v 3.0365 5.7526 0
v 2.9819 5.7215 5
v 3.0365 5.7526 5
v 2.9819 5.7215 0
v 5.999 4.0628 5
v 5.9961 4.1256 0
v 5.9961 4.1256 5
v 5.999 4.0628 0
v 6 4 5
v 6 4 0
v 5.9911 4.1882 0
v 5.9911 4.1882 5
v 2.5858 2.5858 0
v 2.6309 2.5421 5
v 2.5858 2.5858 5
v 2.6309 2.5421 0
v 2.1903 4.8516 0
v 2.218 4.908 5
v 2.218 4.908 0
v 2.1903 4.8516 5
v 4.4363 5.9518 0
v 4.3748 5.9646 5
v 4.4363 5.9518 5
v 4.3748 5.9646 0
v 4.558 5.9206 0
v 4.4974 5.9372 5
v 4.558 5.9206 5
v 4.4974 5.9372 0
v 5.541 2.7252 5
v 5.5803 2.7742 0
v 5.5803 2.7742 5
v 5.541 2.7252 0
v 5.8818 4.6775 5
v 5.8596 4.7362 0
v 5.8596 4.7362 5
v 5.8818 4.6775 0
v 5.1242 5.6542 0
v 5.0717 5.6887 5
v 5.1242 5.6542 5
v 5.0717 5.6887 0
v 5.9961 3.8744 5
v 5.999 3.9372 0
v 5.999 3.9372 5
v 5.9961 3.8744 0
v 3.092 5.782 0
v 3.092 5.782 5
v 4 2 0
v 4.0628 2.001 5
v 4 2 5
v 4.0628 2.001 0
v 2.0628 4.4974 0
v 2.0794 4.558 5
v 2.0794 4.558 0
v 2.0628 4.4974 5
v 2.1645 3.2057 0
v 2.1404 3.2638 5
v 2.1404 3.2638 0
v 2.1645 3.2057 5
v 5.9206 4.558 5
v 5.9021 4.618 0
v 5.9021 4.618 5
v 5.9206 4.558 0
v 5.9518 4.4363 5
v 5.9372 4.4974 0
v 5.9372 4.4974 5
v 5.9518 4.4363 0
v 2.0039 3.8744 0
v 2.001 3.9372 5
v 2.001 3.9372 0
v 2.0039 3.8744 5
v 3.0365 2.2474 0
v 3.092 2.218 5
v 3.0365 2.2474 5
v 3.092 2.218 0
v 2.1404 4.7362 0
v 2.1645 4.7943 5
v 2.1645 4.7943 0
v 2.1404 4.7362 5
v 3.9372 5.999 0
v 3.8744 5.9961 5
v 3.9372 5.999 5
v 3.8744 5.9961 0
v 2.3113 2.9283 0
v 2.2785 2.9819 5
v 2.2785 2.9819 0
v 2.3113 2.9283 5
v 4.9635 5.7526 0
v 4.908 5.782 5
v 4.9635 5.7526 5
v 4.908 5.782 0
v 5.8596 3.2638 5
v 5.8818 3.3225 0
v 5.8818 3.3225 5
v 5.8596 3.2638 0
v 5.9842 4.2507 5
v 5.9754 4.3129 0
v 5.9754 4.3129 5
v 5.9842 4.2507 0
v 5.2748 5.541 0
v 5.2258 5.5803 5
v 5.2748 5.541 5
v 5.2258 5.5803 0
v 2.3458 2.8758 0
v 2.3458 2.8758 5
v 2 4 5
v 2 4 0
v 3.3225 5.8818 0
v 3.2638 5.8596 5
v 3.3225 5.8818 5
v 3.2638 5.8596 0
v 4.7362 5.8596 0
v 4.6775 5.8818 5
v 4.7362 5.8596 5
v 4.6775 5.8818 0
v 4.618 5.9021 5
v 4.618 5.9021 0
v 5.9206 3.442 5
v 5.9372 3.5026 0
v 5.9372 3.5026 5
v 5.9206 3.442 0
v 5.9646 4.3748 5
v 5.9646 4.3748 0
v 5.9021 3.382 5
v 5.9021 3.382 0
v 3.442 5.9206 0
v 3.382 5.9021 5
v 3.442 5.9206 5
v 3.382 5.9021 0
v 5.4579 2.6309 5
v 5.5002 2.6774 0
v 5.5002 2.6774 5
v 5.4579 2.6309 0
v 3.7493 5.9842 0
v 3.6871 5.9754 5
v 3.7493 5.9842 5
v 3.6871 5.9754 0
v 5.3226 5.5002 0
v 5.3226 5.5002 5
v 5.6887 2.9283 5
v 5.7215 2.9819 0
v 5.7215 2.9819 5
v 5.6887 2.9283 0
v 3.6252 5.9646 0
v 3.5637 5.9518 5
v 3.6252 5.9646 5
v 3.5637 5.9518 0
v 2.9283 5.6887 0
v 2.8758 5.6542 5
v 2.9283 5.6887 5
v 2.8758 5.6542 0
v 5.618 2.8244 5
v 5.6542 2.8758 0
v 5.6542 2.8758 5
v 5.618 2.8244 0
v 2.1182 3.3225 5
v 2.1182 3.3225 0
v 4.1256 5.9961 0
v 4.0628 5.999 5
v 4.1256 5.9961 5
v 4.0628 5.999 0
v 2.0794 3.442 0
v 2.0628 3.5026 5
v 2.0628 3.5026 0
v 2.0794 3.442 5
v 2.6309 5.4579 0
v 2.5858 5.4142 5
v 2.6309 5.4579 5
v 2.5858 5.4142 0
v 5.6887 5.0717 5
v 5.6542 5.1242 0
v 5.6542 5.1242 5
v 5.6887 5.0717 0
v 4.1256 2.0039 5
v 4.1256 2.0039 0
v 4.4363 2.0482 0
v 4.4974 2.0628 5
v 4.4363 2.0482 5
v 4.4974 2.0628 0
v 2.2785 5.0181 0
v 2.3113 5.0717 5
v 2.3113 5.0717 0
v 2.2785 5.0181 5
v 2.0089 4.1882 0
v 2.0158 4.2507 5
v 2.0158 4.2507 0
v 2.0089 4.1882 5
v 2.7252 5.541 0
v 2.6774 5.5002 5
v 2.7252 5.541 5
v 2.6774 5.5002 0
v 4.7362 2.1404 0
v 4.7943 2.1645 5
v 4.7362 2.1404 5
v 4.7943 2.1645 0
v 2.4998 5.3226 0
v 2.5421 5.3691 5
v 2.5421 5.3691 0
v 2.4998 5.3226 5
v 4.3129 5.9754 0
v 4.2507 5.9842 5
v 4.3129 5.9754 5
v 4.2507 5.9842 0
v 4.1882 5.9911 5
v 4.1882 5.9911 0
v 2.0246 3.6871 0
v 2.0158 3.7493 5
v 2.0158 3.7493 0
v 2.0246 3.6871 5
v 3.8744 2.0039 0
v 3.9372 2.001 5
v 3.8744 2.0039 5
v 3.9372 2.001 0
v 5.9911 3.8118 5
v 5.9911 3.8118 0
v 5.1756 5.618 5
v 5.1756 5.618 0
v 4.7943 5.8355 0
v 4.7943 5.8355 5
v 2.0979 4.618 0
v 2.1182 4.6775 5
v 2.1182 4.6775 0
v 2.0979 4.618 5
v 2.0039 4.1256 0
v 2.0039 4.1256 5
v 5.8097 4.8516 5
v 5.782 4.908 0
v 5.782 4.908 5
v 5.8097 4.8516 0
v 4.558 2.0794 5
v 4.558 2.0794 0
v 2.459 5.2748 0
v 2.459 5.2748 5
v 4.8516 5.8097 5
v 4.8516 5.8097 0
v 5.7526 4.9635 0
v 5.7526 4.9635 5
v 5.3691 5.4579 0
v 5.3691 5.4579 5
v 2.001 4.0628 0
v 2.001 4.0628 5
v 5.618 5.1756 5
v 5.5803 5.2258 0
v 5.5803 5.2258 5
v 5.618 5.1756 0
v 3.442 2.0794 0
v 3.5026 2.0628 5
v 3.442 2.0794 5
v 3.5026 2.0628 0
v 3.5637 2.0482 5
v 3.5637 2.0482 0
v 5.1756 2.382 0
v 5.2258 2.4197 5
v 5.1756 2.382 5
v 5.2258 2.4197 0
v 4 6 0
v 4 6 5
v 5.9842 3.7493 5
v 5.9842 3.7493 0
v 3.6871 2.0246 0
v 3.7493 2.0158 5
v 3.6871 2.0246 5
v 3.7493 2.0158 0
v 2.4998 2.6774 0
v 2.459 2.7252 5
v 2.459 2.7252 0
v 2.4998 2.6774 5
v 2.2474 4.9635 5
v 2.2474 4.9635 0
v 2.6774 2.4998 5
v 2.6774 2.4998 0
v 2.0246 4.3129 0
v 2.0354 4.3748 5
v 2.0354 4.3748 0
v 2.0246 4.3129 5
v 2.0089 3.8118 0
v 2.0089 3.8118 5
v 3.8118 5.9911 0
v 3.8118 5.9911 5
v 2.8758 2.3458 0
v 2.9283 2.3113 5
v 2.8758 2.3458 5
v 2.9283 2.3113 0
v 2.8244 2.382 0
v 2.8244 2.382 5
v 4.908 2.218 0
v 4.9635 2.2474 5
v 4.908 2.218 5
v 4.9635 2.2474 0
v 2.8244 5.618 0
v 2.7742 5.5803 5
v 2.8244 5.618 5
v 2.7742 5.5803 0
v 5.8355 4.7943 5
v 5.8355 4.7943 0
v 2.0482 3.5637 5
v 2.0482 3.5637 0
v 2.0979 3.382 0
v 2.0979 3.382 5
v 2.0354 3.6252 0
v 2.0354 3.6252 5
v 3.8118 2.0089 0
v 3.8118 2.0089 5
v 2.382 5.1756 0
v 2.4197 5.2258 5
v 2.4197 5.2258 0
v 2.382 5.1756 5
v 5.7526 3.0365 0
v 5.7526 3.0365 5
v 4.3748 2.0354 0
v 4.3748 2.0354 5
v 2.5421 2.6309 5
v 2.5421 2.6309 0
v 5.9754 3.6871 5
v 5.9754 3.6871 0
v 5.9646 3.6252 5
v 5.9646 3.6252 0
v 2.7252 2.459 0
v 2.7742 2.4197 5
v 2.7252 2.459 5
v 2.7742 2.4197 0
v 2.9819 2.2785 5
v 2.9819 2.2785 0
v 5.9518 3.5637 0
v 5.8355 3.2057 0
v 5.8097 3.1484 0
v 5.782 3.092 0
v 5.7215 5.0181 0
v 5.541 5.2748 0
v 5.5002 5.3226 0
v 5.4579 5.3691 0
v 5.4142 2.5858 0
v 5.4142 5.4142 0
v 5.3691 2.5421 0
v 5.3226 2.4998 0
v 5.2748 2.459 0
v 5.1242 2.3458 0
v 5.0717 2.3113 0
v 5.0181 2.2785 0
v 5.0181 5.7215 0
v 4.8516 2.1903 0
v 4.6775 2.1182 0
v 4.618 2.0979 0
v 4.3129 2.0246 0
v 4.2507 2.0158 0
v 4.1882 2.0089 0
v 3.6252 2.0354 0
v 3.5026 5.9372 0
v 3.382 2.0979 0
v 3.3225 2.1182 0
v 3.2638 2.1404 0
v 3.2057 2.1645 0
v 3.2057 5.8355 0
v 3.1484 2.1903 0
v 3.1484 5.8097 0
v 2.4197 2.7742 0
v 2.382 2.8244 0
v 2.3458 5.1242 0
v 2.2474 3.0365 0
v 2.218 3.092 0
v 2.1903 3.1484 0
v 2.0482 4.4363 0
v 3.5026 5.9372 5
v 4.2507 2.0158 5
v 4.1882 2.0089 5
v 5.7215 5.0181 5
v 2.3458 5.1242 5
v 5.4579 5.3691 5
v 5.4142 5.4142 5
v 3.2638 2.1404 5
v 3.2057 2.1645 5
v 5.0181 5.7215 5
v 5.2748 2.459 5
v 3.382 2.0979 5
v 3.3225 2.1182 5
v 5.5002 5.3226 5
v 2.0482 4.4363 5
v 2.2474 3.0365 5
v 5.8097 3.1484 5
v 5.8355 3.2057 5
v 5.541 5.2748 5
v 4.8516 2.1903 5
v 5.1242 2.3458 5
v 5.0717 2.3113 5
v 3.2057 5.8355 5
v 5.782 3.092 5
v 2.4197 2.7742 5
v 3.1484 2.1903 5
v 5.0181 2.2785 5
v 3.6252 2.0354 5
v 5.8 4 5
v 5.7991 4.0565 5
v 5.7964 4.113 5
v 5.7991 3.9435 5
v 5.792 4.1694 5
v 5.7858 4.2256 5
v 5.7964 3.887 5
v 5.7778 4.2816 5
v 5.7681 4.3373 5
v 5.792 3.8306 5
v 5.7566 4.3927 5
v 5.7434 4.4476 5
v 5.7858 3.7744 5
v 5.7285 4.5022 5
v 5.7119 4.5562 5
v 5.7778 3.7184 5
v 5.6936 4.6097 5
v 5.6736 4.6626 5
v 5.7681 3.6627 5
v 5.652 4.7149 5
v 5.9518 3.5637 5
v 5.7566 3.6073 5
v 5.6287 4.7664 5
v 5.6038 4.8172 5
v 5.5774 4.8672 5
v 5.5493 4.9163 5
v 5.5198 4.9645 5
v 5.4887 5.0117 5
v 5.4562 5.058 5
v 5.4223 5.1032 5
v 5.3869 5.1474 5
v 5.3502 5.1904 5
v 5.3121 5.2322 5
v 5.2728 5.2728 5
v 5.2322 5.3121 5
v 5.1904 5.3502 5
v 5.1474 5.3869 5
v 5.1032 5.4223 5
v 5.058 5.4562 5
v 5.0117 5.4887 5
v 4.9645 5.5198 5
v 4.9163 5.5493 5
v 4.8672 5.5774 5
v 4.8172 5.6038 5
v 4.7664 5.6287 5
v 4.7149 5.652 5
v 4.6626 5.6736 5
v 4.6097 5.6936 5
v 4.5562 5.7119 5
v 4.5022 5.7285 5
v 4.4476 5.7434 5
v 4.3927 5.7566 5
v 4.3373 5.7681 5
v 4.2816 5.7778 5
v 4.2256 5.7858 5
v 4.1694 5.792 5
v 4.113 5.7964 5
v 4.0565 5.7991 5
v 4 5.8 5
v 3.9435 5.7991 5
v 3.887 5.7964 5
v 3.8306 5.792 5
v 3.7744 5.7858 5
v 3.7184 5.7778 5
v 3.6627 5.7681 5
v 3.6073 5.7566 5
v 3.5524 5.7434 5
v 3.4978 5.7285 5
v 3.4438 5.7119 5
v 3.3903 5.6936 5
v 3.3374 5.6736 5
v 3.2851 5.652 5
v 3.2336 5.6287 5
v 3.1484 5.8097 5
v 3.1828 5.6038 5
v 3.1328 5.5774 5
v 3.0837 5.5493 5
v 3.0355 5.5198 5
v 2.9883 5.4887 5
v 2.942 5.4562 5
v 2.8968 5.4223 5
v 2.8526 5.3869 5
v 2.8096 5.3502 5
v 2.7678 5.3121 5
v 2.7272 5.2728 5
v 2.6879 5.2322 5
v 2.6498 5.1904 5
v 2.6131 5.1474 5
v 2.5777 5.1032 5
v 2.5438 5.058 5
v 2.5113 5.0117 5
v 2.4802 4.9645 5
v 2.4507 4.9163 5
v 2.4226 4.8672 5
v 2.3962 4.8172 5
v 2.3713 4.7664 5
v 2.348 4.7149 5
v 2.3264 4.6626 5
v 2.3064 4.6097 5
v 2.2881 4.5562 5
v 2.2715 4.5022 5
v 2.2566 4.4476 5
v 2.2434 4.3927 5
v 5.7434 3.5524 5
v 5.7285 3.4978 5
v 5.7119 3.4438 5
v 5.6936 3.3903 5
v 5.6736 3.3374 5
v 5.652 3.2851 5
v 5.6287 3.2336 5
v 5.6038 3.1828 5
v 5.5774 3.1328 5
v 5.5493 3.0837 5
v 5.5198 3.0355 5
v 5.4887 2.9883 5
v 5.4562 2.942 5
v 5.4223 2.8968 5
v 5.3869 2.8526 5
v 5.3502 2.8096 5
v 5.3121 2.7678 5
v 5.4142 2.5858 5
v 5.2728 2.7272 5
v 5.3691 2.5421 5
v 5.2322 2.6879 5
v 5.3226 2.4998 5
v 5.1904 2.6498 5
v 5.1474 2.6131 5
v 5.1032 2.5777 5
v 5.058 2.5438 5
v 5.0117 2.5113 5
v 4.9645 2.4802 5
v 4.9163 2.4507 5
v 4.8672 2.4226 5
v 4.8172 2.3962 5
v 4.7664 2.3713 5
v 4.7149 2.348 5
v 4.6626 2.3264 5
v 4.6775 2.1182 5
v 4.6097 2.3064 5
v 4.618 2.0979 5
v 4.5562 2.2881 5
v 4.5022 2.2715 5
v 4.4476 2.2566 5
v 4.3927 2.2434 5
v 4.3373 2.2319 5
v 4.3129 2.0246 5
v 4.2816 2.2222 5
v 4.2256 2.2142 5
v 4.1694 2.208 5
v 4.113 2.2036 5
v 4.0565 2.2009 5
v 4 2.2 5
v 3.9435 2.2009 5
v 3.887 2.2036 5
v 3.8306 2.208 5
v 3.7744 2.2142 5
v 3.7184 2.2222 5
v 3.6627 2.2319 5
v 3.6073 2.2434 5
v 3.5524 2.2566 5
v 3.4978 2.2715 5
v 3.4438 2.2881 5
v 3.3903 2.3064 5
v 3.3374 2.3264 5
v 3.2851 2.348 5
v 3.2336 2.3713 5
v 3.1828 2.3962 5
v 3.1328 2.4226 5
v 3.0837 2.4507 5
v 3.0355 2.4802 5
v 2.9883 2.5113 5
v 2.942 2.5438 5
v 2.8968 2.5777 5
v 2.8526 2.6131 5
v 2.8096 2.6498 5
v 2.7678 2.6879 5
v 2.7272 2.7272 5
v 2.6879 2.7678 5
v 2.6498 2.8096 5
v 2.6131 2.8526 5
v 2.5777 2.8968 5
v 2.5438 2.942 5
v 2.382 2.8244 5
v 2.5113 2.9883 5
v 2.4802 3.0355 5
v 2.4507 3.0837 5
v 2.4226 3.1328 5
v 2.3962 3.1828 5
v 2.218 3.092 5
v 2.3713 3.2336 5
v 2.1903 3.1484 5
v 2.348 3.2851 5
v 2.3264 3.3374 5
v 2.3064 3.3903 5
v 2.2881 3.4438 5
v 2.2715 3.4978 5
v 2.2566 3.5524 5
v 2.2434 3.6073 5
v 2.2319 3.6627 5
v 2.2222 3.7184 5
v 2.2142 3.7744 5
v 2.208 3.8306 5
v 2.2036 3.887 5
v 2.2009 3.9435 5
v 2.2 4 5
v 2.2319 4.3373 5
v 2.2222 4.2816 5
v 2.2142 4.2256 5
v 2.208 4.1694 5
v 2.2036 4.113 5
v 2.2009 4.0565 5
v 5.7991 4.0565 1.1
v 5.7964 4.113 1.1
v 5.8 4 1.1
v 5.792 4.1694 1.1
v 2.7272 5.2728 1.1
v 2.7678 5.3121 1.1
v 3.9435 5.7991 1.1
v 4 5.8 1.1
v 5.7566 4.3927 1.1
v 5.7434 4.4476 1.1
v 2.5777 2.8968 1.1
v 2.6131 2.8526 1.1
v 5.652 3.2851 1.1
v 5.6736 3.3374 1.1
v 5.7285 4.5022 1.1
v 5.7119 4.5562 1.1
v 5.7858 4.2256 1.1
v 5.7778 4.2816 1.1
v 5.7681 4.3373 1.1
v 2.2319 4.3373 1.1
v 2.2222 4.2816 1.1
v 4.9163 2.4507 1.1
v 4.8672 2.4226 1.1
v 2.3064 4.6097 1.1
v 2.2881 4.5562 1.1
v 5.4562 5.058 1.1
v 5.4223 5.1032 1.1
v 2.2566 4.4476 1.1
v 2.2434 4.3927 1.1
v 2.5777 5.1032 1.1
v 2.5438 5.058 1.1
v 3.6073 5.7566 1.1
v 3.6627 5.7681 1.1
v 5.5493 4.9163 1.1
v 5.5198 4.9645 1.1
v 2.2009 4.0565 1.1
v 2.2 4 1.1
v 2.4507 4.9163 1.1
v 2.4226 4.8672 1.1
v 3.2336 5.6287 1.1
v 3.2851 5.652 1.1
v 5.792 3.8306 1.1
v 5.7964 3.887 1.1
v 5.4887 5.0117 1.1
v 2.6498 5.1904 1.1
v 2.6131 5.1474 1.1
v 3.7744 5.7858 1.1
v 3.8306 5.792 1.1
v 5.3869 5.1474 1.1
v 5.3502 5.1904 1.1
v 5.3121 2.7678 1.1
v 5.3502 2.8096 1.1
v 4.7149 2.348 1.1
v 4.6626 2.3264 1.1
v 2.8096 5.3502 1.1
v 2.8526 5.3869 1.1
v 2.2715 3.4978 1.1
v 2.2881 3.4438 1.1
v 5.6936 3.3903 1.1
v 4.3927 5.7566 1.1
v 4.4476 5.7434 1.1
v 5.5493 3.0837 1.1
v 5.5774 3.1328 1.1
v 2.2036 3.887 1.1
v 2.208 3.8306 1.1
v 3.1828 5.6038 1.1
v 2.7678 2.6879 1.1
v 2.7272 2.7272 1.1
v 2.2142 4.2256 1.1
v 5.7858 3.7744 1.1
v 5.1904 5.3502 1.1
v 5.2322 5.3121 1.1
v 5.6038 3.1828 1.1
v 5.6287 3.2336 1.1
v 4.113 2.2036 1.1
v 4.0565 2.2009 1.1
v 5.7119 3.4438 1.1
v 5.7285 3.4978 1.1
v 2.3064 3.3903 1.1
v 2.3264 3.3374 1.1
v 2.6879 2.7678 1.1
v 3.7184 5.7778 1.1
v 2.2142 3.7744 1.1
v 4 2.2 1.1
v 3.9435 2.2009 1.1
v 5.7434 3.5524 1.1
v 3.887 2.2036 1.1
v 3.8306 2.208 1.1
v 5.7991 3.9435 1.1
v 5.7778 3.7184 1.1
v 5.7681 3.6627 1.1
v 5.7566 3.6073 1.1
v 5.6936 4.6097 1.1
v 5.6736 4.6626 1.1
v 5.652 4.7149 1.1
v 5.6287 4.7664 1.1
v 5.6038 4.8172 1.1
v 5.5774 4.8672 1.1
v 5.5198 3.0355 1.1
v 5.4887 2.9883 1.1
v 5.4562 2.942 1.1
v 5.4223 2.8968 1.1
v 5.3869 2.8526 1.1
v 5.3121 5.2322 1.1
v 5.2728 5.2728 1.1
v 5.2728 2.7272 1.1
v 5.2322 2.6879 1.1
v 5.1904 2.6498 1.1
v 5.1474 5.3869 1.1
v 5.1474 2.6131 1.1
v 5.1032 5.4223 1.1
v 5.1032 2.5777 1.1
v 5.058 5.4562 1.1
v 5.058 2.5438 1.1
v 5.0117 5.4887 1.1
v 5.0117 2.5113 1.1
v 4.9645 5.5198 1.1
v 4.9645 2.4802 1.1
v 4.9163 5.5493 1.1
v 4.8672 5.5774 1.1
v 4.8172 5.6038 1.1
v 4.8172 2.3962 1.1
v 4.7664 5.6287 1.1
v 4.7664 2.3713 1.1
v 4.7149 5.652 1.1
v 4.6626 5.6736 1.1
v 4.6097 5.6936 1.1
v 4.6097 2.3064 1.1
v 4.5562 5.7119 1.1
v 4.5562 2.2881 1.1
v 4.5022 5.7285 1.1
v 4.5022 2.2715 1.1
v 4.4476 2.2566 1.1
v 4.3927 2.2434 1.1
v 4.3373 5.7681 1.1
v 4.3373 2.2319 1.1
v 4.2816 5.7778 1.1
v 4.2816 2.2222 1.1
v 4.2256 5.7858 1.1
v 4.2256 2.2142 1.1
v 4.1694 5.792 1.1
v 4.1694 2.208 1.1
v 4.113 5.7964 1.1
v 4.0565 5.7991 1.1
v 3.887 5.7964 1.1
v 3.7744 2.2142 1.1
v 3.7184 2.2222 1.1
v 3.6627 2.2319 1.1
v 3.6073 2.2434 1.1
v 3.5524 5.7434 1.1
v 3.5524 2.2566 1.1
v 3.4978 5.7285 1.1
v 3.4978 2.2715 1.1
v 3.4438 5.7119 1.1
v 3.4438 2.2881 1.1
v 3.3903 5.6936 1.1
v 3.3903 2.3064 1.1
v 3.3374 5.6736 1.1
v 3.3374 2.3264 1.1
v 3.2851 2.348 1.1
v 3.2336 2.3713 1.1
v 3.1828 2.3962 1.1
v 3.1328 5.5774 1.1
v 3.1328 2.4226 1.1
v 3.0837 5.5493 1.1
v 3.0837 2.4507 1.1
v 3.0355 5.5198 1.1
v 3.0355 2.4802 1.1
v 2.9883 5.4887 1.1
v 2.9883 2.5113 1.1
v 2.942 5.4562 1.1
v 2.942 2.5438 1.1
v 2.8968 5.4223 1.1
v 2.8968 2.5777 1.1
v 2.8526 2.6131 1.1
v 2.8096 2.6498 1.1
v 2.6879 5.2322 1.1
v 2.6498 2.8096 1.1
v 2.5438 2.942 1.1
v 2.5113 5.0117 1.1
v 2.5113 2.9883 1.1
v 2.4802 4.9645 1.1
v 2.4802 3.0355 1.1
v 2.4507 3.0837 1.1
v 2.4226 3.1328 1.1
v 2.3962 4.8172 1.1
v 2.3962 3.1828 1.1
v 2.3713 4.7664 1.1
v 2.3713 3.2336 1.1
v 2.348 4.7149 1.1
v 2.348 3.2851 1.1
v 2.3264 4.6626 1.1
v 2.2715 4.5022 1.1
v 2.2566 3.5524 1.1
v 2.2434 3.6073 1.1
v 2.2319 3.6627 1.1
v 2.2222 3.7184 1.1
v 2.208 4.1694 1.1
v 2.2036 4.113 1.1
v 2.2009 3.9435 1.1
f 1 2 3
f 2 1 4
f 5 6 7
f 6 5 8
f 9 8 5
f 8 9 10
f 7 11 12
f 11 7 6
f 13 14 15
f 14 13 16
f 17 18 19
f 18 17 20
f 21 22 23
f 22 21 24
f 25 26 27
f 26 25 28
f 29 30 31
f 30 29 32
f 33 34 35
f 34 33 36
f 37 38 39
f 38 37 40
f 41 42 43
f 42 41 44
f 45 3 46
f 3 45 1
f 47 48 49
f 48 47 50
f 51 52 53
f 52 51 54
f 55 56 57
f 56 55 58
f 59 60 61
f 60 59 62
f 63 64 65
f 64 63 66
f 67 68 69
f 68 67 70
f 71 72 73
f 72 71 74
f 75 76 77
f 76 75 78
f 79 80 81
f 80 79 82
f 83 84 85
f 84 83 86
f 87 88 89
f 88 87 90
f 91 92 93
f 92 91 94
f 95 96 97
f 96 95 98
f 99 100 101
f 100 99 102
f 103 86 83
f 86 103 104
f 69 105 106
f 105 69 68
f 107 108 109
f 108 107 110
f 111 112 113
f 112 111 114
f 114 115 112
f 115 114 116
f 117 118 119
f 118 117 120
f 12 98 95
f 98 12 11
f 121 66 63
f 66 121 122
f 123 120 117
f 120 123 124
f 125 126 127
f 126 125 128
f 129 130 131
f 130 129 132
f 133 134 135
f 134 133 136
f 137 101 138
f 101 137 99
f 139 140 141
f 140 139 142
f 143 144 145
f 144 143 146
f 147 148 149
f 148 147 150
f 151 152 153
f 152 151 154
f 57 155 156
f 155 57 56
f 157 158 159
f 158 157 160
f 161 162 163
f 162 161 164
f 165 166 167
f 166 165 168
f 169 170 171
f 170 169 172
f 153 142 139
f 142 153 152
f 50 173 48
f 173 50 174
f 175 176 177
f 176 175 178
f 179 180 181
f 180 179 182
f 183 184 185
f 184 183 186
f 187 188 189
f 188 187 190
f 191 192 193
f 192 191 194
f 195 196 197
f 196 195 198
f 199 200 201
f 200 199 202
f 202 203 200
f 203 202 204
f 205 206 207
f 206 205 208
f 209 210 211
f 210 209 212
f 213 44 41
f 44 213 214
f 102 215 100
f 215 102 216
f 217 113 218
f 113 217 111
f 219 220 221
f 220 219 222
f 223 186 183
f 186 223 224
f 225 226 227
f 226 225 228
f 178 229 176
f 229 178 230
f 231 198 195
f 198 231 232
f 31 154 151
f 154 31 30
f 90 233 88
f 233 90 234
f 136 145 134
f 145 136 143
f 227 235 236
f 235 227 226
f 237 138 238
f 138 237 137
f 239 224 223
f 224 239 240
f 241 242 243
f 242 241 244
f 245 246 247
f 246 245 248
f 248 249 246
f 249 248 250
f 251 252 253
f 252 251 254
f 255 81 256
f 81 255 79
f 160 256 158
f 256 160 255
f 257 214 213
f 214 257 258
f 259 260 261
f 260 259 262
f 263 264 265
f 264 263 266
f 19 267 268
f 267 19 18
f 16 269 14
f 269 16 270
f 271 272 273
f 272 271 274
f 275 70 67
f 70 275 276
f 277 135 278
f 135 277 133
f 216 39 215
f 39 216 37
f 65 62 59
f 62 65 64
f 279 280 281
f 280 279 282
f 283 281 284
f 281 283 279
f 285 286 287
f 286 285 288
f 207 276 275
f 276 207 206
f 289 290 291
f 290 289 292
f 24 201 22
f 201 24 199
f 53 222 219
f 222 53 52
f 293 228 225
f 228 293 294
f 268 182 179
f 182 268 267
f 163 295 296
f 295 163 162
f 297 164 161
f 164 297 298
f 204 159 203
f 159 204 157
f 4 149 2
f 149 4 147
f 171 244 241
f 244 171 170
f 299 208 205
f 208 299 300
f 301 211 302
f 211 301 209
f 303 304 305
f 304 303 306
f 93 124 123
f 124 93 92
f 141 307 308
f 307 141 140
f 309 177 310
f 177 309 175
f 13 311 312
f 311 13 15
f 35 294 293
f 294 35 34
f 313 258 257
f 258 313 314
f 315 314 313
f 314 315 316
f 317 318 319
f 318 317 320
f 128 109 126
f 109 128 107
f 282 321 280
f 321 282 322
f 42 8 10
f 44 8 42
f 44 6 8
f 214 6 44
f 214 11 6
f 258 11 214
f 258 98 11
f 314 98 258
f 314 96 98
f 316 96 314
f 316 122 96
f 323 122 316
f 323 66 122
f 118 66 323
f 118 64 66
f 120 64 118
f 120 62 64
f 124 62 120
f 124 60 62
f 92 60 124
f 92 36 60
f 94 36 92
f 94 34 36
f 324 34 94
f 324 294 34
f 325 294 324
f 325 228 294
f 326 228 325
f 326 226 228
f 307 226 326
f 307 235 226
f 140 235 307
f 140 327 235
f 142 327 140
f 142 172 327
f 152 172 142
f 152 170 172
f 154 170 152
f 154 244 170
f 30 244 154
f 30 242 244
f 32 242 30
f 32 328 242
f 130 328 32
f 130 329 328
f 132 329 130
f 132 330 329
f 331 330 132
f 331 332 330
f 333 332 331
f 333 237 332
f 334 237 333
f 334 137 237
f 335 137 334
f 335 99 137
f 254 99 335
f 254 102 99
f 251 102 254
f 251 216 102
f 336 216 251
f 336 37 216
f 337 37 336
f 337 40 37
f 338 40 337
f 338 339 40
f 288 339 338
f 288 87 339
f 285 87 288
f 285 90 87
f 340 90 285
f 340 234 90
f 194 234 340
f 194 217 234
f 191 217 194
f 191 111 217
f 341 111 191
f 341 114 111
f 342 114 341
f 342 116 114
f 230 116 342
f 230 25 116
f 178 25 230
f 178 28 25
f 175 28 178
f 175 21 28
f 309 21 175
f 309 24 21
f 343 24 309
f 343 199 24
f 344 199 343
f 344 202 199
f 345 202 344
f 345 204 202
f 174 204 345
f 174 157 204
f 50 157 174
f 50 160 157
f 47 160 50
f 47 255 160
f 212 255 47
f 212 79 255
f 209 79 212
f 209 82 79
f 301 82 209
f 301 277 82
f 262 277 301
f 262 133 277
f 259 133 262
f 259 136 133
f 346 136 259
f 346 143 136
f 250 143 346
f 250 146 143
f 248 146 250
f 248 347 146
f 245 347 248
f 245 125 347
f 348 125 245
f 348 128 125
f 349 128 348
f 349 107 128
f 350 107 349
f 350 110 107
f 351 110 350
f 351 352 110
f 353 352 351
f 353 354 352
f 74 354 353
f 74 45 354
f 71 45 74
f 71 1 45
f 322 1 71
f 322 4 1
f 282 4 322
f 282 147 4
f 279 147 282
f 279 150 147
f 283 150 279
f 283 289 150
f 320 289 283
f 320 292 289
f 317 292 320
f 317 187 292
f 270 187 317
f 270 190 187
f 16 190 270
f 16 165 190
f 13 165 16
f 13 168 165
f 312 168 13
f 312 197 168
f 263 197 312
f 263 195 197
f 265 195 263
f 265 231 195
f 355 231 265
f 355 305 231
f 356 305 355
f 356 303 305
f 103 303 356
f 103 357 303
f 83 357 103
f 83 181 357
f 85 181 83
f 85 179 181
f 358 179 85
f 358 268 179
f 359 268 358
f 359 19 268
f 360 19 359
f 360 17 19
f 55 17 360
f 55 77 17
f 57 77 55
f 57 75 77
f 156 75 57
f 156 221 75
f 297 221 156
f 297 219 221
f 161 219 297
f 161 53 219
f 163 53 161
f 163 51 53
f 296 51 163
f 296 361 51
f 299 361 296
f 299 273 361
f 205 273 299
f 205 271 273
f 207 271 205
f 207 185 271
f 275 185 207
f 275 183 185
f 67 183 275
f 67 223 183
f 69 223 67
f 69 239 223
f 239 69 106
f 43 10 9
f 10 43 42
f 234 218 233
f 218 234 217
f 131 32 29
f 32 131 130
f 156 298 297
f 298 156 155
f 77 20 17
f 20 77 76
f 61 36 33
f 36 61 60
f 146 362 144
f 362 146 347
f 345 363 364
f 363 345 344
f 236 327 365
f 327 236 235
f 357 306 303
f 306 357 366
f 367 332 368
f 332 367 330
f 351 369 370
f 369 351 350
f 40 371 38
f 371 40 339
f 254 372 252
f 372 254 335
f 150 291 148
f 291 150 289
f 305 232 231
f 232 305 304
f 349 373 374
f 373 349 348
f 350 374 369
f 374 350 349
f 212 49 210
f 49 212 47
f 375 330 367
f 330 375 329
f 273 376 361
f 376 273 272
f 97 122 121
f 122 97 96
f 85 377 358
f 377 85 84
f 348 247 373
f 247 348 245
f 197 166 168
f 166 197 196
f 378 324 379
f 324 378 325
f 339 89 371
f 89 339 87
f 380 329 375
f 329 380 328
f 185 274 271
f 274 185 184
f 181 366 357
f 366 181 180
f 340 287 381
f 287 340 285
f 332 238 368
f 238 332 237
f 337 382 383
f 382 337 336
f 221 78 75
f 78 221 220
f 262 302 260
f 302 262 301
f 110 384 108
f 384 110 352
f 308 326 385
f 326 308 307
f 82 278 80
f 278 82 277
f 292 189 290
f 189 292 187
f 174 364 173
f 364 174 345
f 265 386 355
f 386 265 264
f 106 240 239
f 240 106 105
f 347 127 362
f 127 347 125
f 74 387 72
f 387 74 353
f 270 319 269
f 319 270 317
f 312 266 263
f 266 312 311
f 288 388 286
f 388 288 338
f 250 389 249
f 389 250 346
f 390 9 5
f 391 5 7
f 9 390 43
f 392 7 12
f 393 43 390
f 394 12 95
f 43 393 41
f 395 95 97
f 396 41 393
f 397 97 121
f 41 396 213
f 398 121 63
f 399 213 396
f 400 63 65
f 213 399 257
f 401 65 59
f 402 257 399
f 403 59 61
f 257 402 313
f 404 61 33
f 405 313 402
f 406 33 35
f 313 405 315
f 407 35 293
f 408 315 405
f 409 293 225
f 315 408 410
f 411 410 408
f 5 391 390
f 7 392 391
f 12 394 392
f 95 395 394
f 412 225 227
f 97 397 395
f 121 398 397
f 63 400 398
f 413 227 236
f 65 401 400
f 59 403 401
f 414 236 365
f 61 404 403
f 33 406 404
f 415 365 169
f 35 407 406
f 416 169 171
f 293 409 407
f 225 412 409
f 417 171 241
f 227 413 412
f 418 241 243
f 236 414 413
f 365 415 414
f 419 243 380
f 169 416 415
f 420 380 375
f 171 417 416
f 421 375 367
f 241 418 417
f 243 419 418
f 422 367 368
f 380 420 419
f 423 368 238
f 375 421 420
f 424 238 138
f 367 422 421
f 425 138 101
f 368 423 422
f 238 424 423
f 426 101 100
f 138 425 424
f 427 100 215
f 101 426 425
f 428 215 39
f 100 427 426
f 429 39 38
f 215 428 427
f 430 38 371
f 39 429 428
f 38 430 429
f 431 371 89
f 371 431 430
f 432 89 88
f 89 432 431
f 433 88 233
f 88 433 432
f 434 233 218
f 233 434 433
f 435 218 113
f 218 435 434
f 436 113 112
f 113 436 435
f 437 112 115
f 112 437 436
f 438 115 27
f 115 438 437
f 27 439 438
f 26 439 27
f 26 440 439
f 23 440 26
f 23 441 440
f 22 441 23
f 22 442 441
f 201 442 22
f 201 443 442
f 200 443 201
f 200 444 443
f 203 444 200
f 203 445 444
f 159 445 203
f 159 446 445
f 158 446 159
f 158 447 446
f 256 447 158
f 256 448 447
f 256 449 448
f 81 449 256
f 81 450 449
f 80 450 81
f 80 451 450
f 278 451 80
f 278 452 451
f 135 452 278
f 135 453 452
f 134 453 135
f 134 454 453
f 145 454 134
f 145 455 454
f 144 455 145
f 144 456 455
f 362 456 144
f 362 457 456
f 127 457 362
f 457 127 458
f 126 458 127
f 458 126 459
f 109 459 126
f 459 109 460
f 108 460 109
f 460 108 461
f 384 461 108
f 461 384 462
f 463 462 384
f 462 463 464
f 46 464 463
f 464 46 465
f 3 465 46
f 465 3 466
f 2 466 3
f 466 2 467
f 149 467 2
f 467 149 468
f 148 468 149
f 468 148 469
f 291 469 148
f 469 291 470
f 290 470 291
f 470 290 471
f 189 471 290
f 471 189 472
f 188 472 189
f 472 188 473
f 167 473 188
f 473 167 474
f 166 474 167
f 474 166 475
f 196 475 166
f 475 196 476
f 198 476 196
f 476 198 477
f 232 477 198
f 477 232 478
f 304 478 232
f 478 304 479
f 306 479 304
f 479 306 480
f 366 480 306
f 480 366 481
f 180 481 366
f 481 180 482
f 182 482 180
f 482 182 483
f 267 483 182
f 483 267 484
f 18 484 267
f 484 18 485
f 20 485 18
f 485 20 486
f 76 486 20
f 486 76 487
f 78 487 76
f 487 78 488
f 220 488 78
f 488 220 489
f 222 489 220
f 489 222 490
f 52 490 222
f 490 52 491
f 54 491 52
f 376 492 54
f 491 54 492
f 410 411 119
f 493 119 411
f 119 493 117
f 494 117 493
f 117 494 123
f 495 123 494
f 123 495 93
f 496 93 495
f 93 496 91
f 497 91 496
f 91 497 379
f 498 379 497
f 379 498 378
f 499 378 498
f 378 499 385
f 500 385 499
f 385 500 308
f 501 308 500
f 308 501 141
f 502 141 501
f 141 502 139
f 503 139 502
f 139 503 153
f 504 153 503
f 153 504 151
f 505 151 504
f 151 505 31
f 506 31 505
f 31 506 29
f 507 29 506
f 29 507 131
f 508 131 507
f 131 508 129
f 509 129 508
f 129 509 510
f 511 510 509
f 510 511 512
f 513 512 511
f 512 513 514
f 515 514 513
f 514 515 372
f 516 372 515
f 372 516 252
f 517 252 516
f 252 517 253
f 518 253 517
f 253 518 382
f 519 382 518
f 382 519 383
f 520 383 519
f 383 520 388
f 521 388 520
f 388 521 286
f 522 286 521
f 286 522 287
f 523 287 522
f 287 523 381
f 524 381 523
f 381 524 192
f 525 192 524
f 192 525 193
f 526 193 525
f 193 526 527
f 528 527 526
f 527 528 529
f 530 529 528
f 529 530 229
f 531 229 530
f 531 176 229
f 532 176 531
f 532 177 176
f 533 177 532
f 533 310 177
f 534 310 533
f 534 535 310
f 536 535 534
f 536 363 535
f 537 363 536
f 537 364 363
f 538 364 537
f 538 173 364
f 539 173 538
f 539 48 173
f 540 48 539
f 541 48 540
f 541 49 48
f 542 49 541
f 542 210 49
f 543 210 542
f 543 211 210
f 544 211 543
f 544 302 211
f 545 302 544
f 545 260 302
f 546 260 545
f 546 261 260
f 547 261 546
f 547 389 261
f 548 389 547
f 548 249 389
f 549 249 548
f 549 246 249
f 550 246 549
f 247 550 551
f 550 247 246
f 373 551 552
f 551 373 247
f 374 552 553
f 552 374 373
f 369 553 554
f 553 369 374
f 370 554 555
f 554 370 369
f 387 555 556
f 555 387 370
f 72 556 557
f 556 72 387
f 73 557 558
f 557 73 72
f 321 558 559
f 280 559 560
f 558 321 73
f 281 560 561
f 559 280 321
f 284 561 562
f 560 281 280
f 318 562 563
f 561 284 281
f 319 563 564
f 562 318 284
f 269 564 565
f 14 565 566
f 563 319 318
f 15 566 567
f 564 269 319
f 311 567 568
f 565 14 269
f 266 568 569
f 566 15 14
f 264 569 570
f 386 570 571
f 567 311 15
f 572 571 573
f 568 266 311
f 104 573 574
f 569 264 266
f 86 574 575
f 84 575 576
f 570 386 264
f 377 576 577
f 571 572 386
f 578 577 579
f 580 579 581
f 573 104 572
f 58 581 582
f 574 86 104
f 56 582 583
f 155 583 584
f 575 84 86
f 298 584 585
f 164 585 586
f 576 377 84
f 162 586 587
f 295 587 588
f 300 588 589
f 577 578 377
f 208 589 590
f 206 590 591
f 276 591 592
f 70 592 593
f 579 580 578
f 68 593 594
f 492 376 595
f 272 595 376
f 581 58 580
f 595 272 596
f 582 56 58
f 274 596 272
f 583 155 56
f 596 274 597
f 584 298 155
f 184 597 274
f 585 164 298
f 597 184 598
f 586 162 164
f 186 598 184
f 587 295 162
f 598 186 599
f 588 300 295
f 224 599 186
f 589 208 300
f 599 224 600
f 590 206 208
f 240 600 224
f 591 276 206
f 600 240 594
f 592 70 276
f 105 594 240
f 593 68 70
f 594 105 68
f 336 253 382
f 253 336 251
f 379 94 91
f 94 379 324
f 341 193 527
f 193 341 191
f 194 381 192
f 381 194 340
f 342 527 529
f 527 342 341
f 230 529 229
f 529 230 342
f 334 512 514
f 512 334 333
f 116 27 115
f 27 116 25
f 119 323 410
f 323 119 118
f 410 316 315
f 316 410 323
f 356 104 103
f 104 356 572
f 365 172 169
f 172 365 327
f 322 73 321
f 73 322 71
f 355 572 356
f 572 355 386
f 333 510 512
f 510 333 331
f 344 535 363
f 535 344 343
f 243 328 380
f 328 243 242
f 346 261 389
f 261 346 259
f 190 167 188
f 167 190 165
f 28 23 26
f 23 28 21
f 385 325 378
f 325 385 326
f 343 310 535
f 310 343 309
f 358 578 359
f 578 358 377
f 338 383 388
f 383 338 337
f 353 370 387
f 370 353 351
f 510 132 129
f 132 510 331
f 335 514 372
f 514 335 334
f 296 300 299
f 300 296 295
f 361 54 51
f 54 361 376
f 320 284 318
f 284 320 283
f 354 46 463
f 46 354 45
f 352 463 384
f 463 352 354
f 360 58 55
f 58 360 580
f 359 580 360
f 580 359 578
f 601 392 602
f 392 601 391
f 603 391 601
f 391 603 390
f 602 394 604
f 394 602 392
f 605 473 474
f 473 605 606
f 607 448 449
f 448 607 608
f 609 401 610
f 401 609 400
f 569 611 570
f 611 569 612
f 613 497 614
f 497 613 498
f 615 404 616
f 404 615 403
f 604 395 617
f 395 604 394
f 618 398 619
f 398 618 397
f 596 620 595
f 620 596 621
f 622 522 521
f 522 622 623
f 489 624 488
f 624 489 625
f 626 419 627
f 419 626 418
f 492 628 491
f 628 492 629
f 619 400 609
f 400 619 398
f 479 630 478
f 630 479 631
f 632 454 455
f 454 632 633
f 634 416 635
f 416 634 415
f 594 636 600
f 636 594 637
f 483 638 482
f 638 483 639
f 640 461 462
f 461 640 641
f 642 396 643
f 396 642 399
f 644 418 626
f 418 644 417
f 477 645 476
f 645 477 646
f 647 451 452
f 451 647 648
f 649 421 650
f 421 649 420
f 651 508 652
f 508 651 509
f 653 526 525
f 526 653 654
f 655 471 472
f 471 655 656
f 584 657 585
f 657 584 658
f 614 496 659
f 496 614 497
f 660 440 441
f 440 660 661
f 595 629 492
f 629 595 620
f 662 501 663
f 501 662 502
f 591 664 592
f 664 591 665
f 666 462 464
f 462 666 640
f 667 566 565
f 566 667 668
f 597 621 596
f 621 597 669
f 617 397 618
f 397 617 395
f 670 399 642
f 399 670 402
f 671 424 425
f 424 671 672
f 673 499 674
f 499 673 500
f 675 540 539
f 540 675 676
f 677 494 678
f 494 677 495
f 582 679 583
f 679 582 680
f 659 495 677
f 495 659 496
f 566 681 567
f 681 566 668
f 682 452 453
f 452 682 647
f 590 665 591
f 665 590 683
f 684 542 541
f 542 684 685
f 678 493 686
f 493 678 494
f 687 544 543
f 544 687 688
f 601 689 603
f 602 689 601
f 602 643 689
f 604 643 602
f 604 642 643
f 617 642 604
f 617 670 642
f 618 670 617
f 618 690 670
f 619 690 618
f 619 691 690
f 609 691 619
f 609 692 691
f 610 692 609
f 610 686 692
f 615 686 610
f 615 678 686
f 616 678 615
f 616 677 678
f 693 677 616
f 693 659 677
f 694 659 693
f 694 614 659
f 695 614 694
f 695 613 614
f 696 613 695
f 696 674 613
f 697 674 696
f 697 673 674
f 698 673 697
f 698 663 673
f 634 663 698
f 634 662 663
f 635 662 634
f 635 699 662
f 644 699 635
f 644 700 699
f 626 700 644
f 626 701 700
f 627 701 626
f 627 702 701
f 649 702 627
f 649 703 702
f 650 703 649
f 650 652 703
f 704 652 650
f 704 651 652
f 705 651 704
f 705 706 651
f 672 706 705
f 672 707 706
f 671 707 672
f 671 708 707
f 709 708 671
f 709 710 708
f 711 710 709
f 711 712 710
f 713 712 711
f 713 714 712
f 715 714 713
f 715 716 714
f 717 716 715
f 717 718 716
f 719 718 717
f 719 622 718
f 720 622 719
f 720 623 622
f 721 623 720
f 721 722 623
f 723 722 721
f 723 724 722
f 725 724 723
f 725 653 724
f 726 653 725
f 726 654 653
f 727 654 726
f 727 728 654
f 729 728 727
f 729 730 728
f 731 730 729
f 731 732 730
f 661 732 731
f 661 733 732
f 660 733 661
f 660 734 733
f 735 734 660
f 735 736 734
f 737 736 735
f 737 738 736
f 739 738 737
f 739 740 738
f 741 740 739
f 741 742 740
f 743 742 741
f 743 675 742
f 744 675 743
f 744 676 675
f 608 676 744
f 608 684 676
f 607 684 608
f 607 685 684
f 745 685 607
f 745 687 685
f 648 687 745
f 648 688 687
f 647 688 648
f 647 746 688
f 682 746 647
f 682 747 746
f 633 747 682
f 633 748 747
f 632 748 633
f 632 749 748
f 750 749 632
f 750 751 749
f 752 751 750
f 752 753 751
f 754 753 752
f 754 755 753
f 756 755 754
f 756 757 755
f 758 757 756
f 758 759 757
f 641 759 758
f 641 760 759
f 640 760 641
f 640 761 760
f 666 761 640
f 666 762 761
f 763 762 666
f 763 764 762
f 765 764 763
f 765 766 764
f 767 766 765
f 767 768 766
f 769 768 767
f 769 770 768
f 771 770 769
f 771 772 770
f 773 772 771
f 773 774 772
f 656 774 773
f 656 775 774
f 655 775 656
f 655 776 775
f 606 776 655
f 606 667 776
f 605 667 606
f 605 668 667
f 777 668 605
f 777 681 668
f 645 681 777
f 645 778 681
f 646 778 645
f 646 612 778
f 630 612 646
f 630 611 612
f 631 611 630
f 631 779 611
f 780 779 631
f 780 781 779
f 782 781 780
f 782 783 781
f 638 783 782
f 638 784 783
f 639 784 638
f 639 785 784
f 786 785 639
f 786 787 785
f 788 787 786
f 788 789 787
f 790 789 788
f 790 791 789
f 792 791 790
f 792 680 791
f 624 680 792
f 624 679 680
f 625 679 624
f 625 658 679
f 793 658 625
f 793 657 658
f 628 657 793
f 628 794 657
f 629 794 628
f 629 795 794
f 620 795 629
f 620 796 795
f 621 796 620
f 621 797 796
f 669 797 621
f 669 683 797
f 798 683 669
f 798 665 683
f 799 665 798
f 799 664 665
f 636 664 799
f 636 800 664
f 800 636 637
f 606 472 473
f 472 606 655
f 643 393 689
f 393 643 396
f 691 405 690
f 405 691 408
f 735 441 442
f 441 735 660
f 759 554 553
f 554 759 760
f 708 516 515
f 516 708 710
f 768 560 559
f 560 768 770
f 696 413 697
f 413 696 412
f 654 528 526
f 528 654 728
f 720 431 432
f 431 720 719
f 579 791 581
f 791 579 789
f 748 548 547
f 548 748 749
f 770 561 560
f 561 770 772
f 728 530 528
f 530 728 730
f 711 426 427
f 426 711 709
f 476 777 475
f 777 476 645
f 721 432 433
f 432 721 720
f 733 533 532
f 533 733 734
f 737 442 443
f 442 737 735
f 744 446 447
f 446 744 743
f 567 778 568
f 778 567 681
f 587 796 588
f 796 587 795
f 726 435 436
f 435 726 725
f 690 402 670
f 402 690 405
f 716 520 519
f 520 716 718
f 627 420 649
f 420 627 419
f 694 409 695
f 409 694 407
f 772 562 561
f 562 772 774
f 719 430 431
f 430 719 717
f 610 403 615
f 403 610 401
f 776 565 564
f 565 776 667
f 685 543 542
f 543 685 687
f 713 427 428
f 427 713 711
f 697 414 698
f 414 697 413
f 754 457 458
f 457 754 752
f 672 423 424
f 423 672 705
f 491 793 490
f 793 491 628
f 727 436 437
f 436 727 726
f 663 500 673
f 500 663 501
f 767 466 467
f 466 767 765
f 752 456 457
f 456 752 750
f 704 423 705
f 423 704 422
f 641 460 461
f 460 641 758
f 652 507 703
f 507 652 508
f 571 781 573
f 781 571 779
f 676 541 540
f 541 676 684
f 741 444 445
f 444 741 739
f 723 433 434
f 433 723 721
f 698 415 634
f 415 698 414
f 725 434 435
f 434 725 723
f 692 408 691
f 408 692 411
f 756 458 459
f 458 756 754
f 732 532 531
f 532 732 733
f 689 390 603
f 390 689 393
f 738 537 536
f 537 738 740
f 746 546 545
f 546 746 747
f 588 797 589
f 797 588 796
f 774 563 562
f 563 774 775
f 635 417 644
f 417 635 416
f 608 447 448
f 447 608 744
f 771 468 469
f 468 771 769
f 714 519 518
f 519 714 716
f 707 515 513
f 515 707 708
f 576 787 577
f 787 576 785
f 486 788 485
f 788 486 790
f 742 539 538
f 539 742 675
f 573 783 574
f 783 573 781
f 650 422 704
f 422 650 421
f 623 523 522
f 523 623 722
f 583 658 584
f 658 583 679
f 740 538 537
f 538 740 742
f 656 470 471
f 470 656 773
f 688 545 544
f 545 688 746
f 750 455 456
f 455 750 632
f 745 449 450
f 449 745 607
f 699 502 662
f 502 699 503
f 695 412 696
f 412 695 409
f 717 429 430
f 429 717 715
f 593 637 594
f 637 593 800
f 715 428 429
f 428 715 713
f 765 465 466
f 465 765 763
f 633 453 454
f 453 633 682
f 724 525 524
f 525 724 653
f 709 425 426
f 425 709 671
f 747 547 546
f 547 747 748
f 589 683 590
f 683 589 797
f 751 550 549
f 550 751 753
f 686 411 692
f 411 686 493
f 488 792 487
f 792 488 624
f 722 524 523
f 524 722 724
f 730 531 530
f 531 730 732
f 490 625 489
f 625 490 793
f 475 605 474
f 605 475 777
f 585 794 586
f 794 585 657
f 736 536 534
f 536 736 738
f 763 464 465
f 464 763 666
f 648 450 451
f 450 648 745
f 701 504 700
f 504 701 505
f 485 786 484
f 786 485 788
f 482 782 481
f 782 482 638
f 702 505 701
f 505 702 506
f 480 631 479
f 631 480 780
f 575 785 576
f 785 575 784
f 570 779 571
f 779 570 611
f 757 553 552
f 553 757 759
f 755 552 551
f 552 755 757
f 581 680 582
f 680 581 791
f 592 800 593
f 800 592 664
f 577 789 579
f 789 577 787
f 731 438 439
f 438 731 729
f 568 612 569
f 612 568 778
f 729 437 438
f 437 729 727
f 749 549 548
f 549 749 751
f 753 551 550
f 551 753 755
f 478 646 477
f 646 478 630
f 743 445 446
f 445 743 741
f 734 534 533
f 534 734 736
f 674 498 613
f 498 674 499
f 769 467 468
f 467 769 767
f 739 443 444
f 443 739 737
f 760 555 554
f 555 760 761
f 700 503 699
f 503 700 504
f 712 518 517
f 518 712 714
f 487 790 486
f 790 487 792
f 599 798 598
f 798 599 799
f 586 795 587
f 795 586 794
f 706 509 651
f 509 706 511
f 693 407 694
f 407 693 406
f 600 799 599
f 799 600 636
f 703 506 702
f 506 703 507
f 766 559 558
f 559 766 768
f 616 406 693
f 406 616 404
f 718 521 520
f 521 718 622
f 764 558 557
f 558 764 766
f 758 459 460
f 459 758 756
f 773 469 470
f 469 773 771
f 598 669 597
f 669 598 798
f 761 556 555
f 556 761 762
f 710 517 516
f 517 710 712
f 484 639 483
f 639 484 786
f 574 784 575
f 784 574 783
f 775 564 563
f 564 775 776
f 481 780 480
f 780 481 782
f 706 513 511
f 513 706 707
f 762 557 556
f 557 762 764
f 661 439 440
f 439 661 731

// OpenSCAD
module recipient(inaltime_recipient,raza_recipient)   
translate([4,4,0])
difference(){
cylinder (h=inaltime_recipient,r=raza_recipient,$fn=200);
    translate([0,0,inaltime_recipient-(inaltime_recipient-1.1)])
    cylinder (h=inaltime_recipient-1,r=raza_recipient-0.2,$fn=200);
}
recipient(5,2);
